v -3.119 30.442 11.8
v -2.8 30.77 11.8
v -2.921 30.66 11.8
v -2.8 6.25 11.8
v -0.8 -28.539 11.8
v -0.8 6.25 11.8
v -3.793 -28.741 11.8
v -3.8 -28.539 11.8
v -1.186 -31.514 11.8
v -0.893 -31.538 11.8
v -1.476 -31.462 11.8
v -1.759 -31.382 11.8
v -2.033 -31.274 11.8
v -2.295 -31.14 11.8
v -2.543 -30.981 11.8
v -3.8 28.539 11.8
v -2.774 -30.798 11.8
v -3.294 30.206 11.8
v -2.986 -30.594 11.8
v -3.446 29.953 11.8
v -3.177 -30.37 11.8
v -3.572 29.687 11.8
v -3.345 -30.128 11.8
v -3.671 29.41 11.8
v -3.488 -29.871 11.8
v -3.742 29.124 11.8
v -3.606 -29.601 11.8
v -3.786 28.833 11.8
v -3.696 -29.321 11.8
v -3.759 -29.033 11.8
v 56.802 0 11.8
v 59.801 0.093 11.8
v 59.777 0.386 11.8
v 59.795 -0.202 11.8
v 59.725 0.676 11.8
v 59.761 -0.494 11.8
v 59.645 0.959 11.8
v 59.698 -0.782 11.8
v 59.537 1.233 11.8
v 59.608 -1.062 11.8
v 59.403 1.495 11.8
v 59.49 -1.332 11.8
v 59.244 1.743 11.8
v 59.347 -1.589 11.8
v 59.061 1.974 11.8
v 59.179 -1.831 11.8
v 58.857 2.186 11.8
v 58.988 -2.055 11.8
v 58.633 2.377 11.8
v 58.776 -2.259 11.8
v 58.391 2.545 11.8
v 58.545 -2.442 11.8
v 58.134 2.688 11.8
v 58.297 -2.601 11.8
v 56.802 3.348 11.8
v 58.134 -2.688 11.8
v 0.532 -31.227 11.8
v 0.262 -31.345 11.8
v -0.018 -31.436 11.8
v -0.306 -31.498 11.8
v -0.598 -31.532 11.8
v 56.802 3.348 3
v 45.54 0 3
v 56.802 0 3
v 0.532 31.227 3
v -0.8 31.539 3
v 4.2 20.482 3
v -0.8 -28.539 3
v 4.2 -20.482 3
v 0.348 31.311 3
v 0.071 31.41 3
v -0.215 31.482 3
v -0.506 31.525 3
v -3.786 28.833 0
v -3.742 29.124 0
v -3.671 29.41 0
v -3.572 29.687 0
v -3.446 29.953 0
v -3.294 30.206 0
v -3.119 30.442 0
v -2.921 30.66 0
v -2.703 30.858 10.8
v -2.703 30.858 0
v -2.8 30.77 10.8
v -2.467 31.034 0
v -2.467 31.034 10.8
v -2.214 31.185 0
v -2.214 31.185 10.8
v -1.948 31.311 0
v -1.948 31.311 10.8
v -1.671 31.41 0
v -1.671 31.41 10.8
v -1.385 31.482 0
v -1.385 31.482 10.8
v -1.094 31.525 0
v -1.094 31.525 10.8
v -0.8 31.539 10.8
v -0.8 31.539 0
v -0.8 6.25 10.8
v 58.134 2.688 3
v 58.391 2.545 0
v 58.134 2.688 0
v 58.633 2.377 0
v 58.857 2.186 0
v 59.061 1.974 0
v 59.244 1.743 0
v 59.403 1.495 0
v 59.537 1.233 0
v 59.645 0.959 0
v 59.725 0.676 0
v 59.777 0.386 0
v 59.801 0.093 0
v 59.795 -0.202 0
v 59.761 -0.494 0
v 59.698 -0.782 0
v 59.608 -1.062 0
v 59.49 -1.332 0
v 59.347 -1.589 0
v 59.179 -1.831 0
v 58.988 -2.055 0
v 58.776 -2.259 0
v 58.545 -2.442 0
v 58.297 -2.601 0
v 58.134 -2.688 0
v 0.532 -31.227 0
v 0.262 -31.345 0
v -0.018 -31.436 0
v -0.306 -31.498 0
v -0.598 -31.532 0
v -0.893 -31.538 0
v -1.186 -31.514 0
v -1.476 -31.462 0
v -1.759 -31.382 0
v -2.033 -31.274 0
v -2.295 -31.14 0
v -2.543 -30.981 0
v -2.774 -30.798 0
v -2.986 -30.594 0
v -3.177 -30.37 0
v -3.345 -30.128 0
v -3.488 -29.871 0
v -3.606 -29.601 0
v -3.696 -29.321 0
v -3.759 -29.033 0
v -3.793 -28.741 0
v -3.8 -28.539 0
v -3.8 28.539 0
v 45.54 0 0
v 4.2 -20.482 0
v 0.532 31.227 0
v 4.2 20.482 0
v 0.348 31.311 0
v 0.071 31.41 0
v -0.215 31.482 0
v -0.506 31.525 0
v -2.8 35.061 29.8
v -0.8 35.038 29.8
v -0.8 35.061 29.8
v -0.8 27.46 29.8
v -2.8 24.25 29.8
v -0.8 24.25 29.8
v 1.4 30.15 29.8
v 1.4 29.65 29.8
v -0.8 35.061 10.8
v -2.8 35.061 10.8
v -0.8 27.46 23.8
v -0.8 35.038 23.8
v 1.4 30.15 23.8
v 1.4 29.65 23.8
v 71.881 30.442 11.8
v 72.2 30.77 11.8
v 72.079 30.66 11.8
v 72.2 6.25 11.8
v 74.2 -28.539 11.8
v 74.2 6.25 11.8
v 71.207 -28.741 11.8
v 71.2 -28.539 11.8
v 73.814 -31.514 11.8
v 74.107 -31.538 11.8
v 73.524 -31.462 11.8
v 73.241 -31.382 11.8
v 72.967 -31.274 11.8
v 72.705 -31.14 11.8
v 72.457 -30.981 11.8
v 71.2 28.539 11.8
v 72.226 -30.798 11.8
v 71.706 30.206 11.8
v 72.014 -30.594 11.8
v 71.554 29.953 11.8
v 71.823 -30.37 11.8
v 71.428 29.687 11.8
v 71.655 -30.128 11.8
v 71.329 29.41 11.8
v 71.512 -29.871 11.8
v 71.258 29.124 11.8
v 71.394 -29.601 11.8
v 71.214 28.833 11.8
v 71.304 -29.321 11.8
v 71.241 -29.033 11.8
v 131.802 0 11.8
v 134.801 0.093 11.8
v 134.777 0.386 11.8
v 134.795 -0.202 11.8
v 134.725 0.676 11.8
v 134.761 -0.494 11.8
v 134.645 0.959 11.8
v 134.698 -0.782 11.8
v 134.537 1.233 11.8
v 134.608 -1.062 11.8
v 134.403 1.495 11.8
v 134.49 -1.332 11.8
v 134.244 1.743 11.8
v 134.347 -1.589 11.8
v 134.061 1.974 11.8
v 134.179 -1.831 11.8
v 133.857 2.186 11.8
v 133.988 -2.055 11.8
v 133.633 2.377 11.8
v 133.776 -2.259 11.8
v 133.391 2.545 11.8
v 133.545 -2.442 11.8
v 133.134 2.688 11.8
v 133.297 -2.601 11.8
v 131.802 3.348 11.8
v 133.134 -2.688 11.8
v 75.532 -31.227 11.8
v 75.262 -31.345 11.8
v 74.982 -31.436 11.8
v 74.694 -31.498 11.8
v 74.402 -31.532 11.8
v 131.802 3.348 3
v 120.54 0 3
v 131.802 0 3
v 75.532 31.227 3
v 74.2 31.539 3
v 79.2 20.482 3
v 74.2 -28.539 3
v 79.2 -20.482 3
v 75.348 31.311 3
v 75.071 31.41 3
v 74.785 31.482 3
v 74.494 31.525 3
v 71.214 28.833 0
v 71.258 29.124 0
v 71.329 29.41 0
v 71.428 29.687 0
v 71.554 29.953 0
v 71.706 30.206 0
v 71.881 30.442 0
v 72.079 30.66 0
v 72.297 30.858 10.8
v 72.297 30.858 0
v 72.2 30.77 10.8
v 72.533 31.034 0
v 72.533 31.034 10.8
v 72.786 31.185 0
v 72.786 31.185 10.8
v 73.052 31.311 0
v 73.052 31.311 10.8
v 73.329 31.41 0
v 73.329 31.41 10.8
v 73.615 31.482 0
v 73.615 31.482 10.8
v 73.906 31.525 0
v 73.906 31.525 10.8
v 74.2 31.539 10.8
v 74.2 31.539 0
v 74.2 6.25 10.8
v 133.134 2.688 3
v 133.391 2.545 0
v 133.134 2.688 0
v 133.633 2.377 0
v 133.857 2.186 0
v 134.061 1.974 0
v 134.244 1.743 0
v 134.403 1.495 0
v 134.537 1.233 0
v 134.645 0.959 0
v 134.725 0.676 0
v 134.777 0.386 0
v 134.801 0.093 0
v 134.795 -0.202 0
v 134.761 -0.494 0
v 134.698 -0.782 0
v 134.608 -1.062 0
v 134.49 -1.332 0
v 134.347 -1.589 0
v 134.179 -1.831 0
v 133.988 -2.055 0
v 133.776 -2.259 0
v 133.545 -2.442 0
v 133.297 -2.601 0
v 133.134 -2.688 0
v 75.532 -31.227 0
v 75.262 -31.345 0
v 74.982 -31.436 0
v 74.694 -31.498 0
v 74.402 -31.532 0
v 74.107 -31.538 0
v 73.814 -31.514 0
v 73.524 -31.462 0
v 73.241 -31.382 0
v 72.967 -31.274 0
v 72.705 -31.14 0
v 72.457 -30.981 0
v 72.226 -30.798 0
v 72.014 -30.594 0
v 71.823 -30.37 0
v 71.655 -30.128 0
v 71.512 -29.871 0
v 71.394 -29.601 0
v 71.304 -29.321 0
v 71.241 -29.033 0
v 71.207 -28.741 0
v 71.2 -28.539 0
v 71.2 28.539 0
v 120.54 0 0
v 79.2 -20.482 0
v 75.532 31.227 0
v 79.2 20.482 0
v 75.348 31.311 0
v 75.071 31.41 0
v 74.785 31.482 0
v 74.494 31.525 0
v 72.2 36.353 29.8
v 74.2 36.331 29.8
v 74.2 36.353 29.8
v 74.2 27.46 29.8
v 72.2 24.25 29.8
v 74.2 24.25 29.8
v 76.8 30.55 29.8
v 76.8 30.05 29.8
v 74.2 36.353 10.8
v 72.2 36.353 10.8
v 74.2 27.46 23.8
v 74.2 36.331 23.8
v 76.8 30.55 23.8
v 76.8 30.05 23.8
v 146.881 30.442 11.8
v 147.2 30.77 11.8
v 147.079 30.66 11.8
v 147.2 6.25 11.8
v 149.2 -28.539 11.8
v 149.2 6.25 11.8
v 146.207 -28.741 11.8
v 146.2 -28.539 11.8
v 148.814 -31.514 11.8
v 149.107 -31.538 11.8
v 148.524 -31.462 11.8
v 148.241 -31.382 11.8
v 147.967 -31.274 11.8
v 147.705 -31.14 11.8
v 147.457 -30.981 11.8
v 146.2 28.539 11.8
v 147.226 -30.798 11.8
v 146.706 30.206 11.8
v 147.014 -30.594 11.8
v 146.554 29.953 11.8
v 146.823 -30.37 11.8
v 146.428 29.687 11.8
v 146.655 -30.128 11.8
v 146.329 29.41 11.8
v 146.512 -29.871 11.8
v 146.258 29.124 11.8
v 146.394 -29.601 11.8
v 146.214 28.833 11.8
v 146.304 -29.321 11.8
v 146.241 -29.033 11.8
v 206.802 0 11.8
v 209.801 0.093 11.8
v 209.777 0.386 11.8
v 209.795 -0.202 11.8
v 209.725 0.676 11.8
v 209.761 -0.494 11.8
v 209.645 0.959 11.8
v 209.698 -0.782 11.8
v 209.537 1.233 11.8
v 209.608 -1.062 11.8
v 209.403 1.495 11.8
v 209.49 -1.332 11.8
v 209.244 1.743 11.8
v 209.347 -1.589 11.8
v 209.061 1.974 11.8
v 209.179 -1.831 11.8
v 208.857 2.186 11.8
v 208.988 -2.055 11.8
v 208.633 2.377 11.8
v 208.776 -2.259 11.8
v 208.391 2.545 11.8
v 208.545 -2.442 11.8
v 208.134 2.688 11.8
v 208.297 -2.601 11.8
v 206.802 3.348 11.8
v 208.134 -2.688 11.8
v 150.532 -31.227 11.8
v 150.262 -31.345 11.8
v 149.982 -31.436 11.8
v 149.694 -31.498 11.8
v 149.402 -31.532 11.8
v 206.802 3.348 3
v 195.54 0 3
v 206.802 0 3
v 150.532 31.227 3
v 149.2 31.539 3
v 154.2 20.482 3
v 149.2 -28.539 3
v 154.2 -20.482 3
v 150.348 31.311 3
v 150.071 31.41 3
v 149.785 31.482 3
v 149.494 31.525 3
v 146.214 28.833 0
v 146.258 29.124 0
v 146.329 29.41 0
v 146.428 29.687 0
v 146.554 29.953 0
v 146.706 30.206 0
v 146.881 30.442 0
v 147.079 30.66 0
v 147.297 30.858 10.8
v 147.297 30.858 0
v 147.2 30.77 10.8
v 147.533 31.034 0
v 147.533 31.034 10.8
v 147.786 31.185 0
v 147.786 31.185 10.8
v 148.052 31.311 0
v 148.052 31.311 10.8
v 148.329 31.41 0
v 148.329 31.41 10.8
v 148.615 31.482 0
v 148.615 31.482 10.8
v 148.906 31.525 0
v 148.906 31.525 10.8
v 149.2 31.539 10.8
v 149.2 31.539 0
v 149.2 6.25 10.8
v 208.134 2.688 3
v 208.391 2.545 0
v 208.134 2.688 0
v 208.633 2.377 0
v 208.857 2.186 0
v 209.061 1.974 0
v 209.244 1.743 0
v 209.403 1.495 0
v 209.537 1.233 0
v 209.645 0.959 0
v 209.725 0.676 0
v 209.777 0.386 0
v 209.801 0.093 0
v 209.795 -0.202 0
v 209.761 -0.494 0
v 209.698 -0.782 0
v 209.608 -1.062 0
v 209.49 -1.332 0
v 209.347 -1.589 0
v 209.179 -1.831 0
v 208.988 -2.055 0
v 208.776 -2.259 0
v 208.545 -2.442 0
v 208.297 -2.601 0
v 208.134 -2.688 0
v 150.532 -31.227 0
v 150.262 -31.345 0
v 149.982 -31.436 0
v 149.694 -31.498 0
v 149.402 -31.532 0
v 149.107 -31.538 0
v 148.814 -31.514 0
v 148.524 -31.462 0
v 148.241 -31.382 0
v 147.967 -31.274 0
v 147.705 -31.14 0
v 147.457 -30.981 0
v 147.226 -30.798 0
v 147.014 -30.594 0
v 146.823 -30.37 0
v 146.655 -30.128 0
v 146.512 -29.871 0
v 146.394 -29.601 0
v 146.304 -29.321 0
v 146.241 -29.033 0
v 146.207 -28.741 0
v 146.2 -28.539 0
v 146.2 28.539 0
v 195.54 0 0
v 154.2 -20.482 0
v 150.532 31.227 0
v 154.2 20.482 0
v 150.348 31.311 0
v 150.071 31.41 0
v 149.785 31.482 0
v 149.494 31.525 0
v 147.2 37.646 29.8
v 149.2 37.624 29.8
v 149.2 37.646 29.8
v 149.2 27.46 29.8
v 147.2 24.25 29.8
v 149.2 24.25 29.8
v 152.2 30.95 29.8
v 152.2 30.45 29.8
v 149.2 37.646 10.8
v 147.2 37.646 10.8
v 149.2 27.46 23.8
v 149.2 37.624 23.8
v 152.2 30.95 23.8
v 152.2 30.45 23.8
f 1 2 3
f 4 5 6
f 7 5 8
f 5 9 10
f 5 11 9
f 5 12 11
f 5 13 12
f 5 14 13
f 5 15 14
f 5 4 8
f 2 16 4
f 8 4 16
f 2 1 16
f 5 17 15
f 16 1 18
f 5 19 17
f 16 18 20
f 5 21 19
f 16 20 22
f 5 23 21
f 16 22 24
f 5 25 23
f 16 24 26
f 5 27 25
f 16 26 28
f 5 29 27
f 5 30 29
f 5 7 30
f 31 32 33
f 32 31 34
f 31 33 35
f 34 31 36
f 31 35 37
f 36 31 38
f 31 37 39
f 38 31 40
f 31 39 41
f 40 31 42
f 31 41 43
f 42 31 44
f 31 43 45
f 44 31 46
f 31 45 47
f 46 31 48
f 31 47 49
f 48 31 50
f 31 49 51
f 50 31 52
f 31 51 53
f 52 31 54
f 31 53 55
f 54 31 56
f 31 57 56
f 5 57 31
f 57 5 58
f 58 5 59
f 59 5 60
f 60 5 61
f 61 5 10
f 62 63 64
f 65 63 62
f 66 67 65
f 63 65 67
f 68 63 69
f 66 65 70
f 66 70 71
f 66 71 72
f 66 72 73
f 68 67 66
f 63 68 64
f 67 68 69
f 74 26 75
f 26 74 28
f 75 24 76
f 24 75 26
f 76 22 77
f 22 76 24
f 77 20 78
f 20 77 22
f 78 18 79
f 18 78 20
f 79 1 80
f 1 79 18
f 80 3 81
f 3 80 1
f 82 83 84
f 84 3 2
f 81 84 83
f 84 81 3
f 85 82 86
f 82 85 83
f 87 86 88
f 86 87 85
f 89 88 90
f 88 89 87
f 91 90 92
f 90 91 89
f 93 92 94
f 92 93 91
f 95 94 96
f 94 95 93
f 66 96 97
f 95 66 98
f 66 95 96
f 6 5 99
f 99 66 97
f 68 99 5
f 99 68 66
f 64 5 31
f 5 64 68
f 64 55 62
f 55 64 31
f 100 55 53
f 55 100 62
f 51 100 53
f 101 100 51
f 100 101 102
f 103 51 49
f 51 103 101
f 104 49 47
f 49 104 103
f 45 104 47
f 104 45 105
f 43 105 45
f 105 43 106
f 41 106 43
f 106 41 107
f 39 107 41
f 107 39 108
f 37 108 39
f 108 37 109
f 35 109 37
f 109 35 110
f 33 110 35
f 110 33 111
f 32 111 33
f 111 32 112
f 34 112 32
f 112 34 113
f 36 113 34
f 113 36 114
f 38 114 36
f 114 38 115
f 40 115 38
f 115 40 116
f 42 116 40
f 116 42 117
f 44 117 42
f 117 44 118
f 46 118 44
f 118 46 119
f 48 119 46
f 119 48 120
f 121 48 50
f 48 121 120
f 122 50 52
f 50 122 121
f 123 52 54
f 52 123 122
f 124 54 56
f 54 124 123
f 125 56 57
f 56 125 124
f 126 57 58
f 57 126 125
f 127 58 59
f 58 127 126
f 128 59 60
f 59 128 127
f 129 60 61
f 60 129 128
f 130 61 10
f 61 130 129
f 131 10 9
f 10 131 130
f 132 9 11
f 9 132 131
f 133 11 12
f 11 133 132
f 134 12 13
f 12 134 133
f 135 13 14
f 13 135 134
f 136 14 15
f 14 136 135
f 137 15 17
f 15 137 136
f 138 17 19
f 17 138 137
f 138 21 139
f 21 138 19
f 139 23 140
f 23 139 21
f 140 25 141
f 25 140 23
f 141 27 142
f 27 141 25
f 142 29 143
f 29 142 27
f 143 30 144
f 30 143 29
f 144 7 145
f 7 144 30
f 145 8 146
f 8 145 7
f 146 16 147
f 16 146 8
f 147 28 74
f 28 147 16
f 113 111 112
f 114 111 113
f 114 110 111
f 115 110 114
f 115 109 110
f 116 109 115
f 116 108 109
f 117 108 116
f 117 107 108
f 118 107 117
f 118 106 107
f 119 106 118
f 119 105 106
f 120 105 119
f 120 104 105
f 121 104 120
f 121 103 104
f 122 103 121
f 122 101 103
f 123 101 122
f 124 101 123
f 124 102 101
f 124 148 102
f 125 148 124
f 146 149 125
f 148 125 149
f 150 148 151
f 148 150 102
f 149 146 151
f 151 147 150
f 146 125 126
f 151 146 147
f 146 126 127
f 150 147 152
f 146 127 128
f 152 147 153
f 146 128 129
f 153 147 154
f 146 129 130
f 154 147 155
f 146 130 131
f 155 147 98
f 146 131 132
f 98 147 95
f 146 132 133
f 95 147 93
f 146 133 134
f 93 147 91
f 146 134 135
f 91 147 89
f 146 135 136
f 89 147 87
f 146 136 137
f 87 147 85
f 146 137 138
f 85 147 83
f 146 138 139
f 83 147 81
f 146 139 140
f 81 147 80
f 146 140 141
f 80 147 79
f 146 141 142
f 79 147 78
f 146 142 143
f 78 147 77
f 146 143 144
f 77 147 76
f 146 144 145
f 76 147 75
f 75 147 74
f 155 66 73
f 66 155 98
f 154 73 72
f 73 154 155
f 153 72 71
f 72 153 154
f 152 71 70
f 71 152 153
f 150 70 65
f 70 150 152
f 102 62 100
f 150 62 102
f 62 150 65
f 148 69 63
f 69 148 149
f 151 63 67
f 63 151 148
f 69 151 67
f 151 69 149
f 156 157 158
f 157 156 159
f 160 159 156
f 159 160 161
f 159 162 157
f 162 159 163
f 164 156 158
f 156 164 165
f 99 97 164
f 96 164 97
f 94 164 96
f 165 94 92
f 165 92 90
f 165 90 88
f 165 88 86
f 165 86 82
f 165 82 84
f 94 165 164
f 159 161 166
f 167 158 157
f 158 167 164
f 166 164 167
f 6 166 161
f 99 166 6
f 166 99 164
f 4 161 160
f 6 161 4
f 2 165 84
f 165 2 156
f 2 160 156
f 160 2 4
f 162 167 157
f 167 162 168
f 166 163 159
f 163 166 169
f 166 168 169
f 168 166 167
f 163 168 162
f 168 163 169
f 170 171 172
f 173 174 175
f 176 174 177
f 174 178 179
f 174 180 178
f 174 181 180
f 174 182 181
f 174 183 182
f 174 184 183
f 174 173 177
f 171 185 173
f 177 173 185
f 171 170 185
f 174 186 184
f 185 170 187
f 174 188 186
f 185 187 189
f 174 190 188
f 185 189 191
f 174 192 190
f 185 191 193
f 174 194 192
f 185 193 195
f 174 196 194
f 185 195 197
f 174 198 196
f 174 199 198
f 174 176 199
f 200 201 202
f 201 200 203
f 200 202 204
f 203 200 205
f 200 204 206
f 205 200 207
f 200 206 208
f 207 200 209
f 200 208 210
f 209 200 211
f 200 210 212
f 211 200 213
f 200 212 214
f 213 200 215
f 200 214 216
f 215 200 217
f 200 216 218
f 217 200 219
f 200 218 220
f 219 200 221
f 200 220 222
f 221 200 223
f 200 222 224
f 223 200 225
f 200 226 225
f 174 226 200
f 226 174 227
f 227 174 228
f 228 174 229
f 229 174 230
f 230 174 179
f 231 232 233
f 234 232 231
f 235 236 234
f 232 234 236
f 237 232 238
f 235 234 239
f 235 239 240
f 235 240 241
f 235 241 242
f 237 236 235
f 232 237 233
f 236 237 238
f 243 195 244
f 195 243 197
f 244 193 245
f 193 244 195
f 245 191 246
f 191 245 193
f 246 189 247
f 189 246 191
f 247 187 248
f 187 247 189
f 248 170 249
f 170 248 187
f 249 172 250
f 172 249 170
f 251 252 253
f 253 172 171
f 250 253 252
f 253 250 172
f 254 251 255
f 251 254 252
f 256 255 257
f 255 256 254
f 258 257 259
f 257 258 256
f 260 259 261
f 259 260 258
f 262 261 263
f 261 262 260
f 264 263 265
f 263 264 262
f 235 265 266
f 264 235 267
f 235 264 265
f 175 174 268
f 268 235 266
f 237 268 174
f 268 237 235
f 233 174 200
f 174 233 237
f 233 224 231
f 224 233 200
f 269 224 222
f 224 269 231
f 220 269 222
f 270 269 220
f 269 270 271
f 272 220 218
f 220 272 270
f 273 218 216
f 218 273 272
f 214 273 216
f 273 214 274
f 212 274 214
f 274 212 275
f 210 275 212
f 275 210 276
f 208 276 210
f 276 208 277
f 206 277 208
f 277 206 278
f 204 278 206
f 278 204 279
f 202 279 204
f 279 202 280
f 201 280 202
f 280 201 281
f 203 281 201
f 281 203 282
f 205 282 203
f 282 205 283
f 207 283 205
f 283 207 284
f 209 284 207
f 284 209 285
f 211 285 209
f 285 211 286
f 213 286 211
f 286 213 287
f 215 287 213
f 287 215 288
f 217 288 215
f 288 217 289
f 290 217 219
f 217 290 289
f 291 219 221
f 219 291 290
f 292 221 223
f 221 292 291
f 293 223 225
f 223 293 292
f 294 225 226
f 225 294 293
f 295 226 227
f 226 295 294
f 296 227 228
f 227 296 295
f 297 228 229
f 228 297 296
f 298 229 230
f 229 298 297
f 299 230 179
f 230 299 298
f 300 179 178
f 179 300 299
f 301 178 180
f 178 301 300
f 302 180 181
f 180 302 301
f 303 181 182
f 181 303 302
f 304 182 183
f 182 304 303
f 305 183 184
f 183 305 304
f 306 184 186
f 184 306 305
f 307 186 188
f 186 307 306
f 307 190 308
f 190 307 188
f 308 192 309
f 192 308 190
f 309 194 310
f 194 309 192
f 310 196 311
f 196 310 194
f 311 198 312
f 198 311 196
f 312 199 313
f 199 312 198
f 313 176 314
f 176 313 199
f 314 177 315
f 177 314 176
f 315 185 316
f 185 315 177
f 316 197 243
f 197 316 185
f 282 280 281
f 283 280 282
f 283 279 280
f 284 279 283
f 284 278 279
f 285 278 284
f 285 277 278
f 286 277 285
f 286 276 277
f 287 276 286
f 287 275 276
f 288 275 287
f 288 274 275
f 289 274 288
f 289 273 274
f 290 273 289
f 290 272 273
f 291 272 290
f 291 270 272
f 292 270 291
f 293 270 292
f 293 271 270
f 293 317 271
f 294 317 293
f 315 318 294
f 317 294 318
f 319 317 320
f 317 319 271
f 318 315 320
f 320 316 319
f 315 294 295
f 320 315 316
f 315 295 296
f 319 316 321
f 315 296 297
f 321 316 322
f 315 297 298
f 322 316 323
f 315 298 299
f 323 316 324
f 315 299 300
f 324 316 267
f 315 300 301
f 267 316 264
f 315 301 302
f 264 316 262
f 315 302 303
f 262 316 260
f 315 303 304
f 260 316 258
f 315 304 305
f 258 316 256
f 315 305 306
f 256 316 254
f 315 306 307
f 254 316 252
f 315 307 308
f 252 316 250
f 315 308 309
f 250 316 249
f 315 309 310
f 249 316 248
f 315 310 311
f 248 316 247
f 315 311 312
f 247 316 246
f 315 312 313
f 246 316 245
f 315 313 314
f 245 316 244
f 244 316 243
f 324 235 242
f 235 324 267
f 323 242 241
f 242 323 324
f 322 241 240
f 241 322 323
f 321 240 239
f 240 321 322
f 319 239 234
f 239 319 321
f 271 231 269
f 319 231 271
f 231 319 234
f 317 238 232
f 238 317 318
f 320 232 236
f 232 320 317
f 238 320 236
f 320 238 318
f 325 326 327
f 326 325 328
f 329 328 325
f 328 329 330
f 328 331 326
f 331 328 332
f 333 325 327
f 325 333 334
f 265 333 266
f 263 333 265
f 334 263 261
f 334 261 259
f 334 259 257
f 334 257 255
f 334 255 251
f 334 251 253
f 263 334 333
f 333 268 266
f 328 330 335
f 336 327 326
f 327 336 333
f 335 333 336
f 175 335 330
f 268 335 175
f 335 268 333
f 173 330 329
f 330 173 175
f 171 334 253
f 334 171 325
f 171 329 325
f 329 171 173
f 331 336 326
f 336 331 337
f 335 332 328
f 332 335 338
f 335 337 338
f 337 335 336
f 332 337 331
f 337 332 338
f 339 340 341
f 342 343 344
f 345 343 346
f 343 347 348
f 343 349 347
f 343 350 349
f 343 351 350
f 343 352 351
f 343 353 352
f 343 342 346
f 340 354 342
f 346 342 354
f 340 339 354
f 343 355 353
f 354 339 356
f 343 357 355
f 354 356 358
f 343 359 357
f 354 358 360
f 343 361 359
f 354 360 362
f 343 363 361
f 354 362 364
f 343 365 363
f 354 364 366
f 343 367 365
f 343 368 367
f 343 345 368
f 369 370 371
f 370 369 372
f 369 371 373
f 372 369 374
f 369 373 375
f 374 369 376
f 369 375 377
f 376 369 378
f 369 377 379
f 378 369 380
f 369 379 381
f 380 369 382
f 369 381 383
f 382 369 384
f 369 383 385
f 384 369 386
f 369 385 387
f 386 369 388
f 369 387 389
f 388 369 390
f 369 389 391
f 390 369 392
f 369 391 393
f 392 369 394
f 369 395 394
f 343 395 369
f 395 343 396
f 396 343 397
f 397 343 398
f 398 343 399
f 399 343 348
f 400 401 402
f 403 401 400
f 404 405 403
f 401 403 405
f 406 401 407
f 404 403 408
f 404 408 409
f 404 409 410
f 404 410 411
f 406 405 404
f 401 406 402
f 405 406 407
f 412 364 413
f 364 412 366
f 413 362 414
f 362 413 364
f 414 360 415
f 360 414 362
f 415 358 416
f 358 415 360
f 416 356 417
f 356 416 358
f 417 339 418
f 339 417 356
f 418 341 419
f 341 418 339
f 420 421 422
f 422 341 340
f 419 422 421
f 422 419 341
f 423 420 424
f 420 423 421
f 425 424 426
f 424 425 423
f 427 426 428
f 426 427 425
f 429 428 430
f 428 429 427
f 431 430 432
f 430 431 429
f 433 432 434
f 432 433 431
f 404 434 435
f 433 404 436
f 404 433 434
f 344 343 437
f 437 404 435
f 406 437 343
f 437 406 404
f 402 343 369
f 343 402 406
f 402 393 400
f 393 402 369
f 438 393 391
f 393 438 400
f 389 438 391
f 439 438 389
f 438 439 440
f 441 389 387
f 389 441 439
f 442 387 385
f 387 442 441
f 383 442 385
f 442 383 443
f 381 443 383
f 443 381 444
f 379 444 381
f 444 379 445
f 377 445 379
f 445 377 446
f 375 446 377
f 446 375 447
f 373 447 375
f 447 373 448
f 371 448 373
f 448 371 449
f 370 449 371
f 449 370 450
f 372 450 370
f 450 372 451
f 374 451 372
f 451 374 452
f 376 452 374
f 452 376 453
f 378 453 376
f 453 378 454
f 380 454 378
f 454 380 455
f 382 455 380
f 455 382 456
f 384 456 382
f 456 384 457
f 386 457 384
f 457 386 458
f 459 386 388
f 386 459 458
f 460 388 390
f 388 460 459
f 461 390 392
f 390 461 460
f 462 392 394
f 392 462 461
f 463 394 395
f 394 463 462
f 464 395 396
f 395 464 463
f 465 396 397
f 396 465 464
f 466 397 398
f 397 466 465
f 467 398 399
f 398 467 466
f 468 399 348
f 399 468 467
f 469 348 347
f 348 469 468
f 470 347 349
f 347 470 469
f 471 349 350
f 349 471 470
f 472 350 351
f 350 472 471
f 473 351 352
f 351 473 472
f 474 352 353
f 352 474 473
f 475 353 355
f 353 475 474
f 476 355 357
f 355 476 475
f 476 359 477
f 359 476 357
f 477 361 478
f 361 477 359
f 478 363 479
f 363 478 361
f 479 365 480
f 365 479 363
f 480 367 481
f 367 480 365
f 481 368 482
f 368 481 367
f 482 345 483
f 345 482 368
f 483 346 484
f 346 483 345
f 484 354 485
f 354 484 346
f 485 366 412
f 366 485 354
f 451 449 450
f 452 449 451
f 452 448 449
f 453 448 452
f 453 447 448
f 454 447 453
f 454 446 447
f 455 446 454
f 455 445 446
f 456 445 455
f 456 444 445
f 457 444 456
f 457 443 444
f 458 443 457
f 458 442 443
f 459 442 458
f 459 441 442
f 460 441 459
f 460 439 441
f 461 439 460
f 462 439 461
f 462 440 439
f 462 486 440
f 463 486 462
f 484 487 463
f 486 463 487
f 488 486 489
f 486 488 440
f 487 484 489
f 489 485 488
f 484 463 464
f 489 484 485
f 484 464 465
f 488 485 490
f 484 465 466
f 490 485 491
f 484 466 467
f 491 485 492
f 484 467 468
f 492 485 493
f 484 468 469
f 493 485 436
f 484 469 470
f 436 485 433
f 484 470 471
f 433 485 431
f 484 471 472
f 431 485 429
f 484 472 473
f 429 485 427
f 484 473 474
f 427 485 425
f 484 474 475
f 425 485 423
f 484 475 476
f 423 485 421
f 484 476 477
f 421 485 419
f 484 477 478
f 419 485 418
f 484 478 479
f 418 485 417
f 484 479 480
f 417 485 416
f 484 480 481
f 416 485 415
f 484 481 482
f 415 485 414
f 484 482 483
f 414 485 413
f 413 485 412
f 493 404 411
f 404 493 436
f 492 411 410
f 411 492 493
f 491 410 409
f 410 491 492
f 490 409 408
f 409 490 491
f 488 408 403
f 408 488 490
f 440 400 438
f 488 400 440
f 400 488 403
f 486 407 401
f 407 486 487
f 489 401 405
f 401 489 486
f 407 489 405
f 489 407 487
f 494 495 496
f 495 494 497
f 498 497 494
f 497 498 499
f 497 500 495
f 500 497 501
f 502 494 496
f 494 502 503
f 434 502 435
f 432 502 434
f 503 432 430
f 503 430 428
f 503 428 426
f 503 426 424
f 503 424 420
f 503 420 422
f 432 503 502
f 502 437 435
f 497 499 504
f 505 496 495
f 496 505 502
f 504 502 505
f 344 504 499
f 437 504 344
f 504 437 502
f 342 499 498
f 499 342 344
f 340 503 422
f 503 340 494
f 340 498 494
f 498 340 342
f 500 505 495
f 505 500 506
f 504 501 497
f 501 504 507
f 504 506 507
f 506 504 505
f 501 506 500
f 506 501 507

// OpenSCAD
// Snap catch test: one cradle end per hook height, to tune spk_snap before printing the cradle.
// Print 1 plate, as laid out: end walls on the bed, no supports. The number under each end wall
// is its spk_snap. Push one end of the speaker into each and pick the one that clicks in and
// holds, but comes out by hand without forcing. Set spk_snap in params.scad to that number.
include <params.scad>
include <lib.scad>

snaps = [0.6, 1.0, 1.4];

for (i = [0 : len(snaps) - 1]) translate([i * 75, 0, 0])
    // end wall's outer face on the bed, the cup and its snap tab pointing up
    translate([0, 0, spk_clear + cup_wall]) rotate([0, 90, 0]) difference() {
        spk_cup_end(snaps[i]);
        // number, read from below
        translate([spk_clear + cup_wall - 0.6, 0, spk_h / 2 + 4]) rotate([90, 0, 90]) linear_extrude(1)
            mirror([1, 0, 0]) text(str(snaps[i]), size = 6, halign = "center", valign = "center");
    }
